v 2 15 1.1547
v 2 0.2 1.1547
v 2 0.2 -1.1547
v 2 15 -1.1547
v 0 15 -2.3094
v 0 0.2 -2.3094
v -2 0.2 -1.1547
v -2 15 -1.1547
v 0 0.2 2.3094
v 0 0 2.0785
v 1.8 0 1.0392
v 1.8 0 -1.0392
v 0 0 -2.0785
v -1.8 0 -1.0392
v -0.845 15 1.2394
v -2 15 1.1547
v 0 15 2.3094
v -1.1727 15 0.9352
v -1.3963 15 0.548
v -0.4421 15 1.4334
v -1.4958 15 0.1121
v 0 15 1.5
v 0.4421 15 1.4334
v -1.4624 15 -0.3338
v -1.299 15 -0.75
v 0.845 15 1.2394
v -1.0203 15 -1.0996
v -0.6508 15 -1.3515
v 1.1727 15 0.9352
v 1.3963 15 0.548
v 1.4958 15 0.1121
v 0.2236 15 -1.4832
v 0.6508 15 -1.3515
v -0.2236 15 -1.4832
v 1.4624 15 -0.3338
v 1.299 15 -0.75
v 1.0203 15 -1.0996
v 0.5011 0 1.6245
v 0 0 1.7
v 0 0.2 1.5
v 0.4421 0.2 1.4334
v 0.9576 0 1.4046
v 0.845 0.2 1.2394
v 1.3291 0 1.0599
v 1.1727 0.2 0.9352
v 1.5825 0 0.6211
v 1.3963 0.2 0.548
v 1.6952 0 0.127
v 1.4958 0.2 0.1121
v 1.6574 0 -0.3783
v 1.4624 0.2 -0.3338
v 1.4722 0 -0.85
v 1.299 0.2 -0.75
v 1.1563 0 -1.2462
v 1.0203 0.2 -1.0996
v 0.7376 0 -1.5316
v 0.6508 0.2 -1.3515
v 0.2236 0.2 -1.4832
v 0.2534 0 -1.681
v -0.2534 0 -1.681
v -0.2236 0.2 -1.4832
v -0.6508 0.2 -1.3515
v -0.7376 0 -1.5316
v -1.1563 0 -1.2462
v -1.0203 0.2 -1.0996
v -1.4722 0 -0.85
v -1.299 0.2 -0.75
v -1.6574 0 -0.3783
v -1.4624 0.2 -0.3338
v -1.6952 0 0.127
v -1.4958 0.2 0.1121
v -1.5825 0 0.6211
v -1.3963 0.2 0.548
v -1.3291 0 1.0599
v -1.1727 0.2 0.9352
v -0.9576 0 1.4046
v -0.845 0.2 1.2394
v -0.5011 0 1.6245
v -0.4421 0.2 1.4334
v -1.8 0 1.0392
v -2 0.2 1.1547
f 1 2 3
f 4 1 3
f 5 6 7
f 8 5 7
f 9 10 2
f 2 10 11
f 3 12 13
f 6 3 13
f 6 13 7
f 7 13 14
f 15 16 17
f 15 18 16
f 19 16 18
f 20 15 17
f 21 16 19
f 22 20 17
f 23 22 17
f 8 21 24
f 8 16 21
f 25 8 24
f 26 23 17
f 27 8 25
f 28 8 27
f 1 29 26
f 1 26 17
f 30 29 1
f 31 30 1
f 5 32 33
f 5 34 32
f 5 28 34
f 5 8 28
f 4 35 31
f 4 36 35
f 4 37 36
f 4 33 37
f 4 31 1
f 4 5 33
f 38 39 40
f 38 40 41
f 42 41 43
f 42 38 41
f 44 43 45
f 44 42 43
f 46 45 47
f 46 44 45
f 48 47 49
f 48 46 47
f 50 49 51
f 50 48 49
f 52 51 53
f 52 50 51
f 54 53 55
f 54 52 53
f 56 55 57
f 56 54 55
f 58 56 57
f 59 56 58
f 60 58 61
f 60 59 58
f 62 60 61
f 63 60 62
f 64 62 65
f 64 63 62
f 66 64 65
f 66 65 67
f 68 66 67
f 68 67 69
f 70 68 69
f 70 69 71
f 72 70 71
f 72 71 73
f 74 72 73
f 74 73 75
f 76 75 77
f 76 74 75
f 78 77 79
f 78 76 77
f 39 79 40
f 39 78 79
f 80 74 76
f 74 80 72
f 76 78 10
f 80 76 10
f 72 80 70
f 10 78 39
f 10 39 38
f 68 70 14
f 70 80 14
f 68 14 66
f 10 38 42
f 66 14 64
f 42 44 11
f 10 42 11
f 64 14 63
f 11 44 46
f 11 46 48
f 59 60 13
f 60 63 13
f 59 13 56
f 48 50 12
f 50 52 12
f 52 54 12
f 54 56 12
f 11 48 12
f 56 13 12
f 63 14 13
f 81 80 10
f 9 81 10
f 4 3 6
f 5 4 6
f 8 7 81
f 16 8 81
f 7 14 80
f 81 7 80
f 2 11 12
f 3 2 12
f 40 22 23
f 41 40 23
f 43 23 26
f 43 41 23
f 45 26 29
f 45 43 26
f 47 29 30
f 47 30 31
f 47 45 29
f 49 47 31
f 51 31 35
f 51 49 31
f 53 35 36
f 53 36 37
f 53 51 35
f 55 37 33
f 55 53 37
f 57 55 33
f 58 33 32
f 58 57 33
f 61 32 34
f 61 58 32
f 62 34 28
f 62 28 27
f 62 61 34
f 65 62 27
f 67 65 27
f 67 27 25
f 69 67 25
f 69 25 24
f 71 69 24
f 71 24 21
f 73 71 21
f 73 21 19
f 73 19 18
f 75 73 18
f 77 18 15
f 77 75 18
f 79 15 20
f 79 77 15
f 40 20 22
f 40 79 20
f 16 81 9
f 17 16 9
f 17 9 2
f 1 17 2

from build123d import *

# Parameters (mm, degrees)
ESQUISSE1_R        = 1.5
BOSS_EXTRU_1_DEPTH = 15
CHANFREIN1_SIZE    = 0.2


with BuildPart() as part:
    # Esquisse1 → Boss.-Extru.1 (new body)
    with BuildSketch(Plane(origin=(0, 0, 0), x_dir=(1, 0, 0), z_dir=(0, 1, 0))):
        Polygon((0, -2.309401077), (2, -1.154700538), (2, 1.154700538), (0, 2.309401077), (-2, 1.154700538), (-2, -1.154700538), align=None)
        with Locations(Location((0, 0, 0), (0, 0, 270))):
            Circle(ESQUISSE1_R, mode=Mode.SUBTRACT)
    extrude(amount=BOSS_EXTRU_1_DEPTH)

    # Chanfrein1
    chanfrein1_edges = [part.edges().sort_by_distance(p)[0] for p in [
        (0, 0, -1.5),
        (-2, 0, 0),
        (-1, 0, -1.732050808),
        (1, 0, -1.732050808),
        (2, 0, 0),
        (1, 0, 1.732050808),
        (-1, 0, 1.732050808),
    ]]
    chamfer(chanfrein1_edges, length=CHANFREIN1_SIZE)


solid = part.part
